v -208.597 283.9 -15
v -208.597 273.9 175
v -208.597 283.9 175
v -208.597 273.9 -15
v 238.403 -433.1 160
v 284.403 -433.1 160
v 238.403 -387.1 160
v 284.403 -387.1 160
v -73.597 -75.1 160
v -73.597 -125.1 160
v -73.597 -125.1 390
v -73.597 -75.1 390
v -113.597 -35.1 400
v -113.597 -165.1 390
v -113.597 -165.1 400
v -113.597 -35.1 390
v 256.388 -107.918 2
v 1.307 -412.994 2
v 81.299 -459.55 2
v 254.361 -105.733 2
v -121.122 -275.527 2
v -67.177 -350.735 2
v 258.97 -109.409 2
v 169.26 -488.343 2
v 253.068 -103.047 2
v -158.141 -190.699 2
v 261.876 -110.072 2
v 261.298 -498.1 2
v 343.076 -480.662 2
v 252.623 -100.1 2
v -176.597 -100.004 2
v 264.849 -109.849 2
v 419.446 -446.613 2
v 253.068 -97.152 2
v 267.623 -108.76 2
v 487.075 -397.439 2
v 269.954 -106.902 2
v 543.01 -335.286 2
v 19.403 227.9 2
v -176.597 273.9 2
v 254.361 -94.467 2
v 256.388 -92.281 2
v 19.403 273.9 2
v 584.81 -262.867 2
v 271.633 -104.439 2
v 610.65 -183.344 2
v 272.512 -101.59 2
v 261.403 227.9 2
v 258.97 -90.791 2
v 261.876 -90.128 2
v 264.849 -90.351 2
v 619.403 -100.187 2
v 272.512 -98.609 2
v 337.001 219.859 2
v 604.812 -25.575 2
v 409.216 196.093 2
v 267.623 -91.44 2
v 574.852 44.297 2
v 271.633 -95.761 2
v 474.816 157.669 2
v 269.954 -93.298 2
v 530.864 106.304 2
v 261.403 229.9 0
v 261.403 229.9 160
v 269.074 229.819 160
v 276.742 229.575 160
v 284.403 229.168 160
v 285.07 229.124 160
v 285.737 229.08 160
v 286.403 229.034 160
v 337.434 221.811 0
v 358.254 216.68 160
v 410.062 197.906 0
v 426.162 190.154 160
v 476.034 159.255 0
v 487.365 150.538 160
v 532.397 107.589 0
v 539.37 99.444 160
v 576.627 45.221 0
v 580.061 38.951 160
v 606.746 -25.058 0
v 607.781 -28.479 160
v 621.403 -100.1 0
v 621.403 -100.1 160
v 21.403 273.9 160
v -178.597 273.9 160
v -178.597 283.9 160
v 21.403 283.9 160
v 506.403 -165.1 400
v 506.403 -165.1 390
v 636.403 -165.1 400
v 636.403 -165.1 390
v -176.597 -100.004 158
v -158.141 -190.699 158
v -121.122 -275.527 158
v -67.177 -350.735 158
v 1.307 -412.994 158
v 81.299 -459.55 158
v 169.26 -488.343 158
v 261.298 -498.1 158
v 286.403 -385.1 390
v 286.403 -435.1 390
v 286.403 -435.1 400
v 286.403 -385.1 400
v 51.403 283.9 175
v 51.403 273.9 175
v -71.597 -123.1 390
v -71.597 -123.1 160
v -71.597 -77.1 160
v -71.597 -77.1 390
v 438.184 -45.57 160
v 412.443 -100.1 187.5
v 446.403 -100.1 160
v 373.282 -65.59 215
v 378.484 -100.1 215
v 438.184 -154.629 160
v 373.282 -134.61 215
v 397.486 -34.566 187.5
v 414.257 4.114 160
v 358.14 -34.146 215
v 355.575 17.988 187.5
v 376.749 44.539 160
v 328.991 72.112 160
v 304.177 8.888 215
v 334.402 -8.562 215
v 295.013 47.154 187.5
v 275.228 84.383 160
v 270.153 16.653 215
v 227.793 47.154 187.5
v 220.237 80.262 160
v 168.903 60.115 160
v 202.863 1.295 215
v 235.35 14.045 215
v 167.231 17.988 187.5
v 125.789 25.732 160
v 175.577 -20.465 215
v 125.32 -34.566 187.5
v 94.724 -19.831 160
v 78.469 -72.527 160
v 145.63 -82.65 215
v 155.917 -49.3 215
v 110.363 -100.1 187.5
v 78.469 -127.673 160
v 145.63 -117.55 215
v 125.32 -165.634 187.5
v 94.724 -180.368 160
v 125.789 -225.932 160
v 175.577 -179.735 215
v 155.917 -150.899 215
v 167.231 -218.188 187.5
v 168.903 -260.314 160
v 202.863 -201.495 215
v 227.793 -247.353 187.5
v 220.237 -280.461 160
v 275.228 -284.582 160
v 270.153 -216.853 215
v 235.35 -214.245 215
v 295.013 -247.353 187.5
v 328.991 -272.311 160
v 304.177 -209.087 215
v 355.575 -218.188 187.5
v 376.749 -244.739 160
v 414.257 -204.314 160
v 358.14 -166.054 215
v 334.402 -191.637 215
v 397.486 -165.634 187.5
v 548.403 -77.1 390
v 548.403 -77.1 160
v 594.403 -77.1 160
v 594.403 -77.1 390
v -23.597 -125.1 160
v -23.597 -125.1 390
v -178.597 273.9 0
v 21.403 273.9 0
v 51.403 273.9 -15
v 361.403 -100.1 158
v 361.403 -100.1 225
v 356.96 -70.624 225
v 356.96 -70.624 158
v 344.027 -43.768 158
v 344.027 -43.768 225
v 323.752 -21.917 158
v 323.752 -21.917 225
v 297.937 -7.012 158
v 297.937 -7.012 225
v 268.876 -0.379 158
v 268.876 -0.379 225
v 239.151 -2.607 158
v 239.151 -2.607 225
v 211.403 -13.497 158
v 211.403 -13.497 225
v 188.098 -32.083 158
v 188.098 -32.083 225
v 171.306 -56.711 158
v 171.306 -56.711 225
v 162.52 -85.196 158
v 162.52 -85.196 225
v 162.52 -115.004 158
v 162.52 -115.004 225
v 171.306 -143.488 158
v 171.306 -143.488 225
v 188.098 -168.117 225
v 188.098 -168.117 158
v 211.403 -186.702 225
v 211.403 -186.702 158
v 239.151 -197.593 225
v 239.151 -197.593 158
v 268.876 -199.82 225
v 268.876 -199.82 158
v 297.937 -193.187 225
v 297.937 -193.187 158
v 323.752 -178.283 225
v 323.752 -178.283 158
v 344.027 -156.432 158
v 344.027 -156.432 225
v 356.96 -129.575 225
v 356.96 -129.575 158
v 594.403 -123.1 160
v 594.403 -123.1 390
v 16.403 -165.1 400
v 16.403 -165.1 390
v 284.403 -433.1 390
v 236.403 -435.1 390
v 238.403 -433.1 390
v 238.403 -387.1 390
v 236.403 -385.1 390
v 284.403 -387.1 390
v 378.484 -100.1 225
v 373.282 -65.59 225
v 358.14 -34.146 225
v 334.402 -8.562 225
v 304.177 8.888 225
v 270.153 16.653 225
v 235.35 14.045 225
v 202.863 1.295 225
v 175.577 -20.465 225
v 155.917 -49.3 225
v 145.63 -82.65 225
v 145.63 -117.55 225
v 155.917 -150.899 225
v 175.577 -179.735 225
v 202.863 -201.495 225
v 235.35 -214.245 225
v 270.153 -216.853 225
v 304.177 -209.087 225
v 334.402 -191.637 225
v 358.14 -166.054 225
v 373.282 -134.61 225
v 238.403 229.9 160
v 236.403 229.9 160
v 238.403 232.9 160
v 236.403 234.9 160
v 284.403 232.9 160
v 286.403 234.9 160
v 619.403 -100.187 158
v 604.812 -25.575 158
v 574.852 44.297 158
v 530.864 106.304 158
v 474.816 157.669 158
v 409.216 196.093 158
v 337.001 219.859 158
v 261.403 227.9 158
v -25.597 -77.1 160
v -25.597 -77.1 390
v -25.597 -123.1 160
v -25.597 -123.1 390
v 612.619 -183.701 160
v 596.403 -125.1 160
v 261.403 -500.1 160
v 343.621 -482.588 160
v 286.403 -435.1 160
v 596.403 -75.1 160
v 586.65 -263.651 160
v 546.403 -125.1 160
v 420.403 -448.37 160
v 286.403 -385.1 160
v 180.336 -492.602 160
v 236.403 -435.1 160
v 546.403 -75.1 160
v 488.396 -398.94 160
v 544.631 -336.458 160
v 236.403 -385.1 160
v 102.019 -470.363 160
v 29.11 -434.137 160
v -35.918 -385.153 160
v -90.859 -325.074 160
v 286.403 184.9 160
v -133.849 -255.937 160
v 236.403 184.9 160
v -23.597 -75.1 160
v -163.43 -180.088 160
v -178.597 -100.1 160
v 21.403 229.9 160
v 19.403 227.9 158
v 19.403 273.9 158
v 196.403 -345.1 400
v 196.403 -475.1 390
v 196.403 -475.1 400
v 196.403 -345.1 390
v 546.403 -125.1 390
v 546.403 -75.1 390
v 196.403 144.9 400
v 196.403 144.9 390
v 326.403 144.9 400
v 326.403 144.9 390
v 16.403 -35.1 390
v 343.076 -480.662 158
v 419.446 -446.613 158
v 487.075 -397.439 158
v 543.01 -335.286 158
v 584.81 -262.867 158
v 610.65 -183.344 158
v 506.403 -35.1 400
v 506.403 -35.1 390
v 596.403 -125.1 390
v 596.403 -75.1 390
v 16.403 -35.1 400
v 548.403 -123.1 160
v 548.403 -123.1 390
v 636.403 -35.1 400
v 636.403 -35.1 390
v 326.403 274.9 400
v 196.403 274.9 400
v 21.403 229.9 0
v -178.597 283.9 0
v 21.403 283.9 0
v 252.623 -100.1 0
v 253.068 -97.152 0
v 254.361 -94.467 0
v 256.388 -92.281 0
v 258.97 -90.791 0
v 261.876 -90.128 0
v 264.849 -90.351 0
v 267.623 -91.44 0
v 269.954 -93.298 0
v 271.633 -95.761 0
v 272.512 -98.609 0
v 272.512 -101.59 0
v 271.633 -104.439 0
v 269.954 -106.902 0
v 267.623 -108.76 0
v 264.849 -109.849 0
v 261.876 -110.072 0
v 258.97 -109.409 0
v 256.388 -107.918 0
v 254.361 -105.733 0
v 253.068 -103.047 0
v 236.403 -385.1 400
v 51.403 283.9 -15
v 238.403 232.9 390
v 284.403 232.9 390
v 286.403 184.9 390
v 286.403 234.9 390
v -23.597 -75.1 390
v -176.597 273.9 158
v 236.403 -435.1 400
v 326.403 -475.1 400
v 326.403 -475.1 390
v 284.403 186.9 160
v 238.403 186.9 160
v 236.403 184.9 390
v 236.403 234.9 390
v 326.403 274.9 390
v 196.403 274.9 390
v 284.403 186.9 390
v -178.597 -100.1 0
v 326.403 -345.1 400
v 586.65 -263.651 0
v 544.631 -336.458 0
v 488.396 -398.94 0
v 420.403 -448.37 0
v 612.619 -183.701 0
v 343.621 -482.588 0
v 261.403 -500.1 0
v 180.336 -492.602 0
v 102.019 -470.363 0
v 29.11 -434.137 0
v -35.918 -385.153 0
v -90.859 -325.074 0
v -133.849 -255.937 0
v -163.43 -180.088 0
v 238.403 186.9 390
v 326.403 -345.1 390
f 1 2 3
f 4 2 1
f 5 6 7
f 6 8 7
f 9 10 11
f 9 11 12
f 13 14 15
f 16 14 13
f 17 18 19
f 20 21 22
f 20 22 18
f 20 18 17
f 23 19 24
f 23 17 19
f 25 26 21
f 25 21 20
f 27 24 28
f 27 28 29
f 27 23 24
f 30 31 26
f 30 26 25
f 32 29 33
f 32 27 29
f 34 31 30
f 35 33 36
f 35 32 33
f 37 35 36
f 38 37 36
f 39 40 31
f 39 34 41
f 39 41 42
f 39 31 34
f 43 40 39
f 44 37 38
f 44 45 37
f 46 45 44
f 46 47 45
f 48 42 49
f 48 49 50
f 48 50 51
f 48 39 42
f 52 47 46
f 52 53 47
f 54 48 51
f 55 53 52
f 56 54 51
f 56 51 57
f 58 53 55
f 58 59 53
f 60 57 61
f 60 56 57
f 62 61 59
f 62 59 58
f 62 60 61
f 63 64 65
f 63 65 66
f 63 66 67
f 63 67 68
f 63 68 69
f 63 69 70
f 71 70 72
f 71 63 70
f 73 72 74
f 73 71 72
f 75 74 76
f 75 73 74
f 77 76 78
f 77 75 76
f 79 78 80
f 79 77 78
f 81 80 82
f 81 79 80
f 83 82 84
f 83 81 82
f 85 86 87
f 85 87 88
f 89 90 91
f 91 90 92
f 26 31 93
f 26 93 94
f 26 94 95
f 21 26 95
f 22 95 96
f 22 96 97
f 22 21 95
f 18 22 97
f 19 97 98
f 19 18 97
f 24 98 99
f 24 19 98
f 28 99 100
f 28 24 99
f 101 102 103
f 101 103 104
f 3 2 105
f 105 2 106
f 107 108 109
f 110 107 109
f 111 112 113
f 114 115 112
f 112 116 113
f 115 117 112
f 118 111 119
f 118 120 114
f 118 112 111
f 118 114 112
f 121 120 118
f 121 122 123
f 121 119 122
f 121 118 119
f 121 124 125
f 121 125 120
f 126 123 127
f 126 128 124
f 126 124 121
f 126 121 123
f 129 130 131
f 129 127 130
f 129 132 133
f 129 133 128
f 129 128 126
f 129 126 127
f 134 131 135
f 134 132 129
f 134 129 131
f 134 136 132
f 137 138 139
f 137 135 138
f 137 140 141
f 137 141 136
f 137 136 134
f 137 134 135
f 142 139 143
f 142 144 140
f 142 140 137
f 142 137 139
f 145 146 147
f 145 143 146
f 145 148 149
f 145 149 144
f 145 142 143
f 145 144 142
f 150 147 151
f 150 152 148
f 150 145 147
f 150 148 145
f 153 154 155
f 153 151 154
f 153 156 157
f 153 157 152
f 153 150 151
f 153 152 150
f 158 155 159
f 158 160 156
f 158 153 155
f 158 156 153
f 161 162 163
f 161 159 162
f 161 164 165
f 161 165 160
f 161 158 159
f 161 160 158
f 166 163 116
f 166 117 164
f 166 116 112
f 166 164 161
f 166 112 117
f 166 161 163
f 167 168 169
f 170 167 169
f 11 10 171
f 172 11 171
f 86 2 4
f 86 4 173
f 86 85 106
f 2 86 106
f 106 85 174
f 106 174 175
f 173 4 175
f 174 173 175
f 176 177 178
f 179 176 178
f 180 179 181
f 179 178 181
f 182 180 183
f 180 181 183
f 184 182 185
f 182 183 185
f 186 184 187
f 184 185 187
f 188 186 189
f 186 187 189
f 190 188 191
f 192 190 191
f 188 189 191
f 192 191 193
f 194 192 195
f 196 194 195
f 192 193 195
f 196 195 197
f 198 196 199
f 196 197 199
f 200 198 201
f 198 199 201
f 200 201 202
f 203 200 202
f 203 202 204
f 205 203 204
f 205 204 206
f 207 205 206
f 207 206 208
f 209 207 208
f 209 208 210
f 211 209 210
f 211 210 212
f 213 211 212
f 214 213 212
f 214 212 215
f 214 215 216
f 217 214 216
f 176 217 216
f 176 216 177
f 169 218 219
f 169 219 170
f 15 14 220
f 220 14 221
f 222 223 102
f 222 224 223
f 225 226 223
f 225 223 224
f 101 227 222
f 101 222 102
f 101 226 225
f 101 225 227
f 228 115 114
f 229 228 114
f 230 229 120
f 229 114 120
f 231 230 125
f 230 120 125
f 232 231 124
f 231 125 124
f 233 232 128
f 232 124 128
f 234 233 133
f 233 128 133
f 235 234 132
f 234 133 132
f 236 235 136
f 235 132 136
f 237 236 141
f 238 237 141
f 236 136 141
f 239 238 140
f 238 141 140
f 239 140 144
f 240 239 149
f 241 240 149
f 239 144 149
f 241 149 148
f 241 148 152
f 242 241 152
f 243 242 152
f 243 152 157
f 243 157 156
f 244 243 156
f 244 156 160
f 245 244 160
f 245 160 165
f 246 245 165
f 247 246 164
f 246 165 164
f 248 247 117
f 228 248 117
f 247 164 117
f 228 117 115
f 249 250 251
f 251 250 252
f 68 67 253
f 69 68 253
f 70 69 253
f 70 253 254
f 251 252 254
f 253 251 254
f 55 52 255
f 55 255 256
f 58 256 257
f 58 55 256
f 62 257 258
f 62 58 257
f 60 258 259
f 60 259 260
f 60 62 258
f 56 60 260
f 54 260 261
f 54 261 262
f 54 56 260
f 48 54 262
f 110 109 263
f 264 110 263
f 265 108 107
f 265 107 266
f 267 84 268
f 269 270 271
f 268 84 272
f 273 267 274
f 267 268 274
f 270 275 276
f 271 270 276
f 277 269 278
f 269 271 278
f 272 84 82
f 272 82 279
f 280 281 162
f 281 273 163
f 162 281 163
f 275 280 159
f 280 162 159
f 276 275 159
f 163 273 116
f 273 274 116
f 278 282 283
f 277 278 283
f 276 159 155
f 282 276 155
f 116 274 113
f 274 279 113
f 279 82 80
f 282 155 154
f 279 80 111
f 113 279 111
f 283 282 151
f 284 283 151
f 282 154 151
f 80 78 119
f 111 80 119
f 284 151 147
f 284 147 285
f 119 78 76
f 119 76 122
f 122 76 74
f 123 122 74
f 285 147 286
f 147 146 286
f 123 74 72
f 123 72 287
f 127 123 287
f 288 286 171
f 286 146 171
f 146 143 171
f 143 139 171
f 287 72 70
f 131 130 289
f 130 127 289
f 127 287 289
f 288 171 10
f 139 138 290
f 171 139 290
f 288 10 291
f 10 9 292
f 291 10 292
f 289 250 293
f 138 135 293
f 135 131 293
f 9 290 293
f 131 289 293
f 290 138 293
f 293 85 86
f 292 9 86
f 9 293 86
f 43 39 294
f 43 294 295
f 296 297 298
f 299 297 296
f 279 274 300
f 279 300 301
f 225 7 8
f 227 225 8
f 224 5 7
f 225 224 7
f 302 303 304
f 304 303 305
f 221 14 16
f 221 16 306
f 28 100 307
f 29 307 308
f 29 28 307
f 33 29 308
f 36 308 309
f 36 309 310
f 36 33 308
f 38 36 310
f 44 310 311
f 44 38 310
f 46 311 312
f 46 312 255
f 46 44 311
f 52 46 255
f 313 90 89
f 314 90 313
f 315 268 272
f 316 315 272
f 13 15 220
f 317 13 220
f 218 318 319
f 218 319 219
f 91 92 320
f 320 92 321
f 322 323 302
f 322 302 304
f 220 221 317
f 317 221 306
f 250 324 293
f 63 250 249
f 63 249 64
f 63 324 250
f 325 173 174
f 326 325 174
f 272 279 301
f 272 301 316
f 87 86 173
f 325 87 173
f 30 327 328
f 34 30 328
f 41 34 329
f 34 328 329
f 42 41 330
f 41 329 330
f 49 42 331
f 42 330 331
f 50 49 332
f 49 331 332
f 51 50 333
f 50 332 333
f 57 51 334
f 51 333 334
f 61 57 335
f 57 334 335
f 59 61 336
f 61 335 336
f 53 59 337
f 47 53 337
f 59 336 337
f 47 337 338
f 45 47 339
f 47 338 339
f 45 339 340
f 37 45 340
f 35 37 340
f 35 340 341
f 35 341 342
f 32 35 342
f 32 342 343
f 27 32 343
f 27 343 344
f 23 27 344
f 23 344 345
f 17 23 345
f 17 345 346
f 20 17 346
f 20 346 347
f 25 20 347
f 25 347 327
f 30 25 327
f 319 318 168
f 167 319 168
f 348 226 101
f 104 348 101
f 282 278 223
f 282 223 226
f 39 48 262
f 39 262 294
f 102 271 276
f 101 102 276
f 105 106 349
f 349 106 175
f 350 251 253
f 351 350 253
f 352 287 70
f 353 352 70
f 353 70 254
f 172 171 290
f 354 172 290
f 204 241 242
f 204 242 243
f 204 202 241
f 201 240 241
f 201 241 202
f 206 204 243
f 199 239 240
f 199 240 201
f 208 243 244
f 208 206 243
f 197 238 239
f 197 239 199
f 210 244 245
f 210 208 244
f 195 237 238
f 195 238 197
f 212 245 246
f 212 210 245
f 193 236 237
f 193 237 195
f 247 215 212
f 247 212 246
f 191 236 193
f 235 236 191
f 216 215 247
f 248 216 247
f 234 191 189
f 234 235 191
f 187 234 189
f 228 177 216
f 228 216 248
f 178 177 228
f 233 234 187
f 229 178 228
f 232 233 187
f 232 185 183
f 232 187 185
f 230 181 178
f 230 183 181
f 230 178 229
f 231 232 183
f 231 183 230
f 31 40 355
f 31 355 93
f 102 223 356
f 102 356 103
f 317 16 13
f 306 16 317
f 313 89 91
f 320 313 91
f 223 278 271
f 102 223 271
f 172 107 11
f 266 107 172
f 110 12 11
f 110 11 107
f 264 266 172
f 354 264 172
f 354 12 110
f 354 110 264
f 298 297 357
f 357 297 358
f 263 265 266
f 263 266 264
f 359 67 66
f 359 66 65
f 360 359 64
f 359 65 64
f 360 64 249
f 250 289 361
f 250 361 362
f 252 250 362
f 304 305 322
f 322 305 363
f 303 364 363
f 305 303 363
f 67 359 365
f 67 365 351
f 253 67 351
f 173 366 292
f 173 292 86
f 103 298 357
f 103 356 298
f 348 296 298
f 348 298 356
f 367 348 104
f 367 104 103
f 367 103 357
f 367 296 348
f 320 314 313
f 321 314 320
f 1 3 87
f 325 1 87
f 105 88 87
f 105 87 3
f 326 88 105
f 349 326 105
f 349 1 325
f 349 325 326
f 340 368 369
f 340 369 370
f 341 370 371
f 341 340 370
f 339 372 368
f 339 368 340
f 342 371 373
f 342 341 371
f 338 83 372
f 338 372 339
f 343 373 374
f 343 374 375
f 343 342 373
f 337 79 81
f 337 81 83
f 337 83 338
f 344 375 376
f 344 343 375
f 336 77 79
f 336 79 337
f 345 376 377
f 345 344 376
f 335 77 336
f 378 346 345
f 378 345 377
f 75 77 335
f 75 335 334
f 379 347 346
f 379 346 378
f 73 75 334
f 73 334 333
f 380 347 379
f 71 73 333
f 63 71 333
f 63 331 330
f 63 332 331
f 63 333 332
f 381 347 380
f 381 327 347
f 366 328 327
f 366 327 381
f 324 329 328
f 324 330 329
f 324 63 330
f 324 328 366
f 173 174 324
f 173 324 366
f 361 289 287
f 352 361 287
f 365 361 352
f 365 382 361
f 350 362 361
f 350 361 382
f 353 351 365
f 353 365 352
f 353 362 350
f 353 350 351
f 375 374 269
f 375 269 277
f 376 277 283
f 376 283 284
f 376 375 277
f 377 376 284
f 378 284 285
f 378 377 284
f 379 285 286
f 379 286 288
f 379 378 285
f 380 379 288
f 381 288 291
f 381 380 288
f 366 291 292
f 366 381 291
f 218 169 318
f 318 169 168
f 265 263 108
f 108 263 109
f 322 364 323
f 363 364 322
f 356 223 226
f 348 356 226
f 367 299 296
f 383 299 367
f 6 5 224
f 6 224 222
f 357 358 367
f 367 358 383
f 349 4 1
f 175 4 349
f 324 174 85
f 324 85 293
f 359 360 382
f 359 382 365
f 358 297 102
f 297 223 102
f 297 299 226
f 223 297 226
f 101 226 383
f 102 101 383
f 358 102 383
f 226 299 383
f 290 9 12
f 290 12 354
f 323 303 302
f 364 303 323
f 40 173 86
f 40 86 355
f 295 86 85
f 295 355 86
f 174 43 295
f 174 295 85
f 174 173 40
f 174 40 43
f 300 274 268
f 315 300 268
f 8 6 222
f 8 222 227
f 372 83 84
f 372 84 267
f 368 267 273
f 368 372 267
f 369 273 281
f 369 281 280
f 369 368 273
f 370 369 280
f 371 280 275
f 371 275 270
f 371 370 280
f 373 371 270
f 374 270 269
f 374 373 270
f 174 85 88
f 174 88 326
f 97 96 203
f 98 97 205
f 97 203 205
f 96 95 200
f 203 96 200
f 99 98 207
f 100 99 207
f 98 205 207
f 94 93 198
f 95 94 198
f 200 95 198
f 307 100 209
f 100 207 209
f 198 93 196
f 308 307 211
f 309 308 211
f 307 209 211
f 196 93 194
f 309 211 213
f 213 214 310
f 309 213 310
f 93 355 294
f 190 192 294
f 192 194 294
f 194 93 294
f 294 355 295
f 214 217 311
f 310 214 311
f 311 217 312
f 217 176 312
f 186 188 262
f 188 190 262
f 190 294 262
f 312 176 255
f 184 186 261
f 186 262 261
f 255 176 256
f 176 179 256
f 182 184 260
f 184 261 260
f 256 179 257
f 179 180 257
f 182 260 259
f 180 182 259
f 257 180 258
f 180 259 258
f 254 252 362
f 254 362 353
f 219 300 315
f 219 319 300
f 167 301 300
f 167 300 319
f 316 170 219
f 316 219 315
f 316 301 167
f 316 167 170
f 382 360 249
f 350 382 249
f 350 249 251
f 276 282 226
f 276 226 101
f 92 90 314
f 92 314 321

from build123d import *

# Parameters (mm, degrees)
BOSS_EXTRUDE1_DEPTH       = 160
SHELL1_START              = 2
SHELL1_DEPTH              = 156
SKETCH4_R                 = 90
CUT_EXTRUDE1_DEPTH        = 54
SKETCH5_R                 = 185
BOSS_EXTRUDE2_DEPTH       = 55
BOSS_EXTRUDE2_TAPER       = 51
SKETCH6_R                 = 117.080656391
BOSS_EXTRUDE3_DEPTH       = 10
SKETCH7_R                 = 100
CUT_EXTRUDE2_DEPTH        = 117
SKETCH8_R                 = 10
CUT_EXTRUDE3_DEPTH        = 117
SKETCH11_W                = 260
SKETCH11_H                = 190
SKETCH11_W_2              = 200
SKETCH11_H_2              = 160
BOSS_EXTRUDE5_DEPTH       = 10
EXTRUDE_THIN1_OUTLINE_W   = 50
EXTRUDE_THIN1_OUTLINE_H   = 50
EXTRUDE_THIN1_OUTLINE_W_2 = 46
EXTRUDE_THIN1_OUTLINE_H_2 = 46
EXTRUDE_THIN1_DEPTH       = 230
SKETCH16_W                = 130
SKETCH16_H                = 130
BOSS_EXTRUDE6_DEPTH       = 10
SKETCH16_W_2              = 50
SKETCH16_H_2              = 50
BOSS_EXTRUDE6_2_DEPTH     = 10
BOSS_EXTRUDE6_3_DEPTH     = 10
BOSS_EXTRUDE6_4_DEPTH     = 10


# Read off the part's stored shape, not the designer's step: Shell1, Extrude-Thin1
with BuildPart() as part:
    # Sketch2 → Boss-Extrude1 (new body)
    with BuildSketch(Plane.XY):
        with BuildLine():
            Line((-178.596901506, -100.099781817), (-178.596901506, 273.900218183))
            Line((-178.596901506, 273.900218183), (21.403098494, 273.900218183))
            Line((21.403098494, 273.900218183), (21.403098494, 229.900218183))
            Line((21.403098494, 229.900218183), (261.403098494, 229.900218183))
            ThreePointArc((261.403098494, 229.900218183), (505.585407435, 134.917282483), (621.403098494, -100.099781817))
            ThreePointArc((621.403098494, -100.099781817), (518.15029954, -369.172262759), (261.403098494, -500.099781817))
            ThreePointArc((261.403098494, -500.099781817), (-35.918276453, -385.153294258), (-178.596901506, -100.099781817))
        make_face()
    extrude(amount=BOSS_EXTRUDE1_DEPTH)

    # Shell1 outline → Shell1 (cut)
    with BuildSketch(Plane.XY.offset(SHELL1_START)):
        with BuildLine():
            ThreePointArc((-176.596901506, -100.004435497), (-34.576684312, -383.670001847), (261.297822808, -498.099769223))
            ThreePointArc((261.297822808, -498.099769223), (516.669826437, -367.827538484), (619.403089044, -100.18675106))
            ThreePointArc((619.403089044, -100.18675106), (504.20191059, 133.472347591), (261.403098494, 227.900218183))
            Line((261.403098494, 227.900218183), (19.403098494, 227.900218183))
            Line((19.403098494, 227.900218183), (19.403098494, 273.900218183))
            Line((19.403098494, 273.900218183), (-176.596901506, 273.900218183))
            Line((-176.596901506, 273.900218183), (-176.596901506, -100.004435497))
        make_face()
    extrude(amount=SHELL1_DEPTH, mode=Mode.SUBTRACT)

    # Sketch4 → Cut-Extrude1 (cut)
    with BuildSketch(Plane.XY.offset(160)):
        with Locations((261.403098494, -100.099781817)):
            Circle(SKETCH4_R)
    extrude(amount=-CUT_EXTRUDE1_DEPTH, mode=Mode.SUBTRACT)

    # Sketch5 → Boss-Extrude2 (add)
    with BuildSketch(Plane.XY.offset(160)):
        with Locations((261.403098494, -100.099781817)):
            Circle(SKETCH5_R)
    extrude(amount=BOSS_EXTRUDE2_DEPTH, taper=BOSS_EXTRUDE2_TAPER)

    # Sketch6 → Boss-Extrude3 (add)
    with BuildSketch(Plane.XY.offset(215)):
        with Locations((261.403098494, -100.099781817)):
            Circle(SKETCH6_R)
    extrude(amount=BOSS_EXTRUDE3_DEPTH)

    # Sketch7 → Cut-Extrude2 (cut)
    with BuildSketch(Plane.XY.offset(225)):
        with Locations((261.403098494, -100.099781817)):
            Circle(SKETCH7_R)
    extrude(amount=-CUT_EXTRUDE2_DEPTH, mode=Mode.SUBTRACT)

    # Sketch8 → Cut-Extrude3 (cut)
    with BuildSketch(Plane(origin=(0, 0, 0), x_dir=(-1, 0, 0), z_dir=(0, 0, -1))):
        with Locations((-262.623327997, -100.099781817)):
            Circle(SKETCH8_R)
    extrude(amount=-CUT_EXTRUDE3_DEPTH, mode=Mode.SUBTRACT)

    # Extrude-Thin1 outline → Extrude-Thin1 (add)
    # profile 1 of 4: a face of its own
    with BuildSketch(Plane.XY.offset(160)):
        with Locations((-48.596901506, -100.099781817)):
            Rectangle(EXTRUDE_THIN1_OUTLINE_W, EXTRUDE_THIN1_OUTLINE_H)
        with Locations((-48.596901506, -100.099781817)):
            Rectangle(EXTRUDE_THIN1_OUTLINE_W_2, EXTRUDE_THIN1_OUTLINE_H_2, mode=Mode.SUBTRACT)
    # profile 2 of 4: a face of its own
    with BuildSketch(Plane.XY.offset(160)):
        with Locations((571.403098494, -100.099781817)):
            Rectangle(EXTRUDE_THIN1_OUTLINE_W, EXTRUDE_THIN1_OUTLINE_H)
        with Locations((571.403098494, -100.099781817)):
            Rectangle(EXTRUDE_THIN1_OUTLINE_W_2, EXTRUDE_THIN1_OUTLINE_H_2, mode=Mode.SUBTRACT)
    # profile 3 of 4: a face of its own
    with BuildSketch(Plane.XY.offset(160)):
        with Locations((261.403098494, 209.900218183)):
            Rectangle(EXTRUDE_THIN1_OUTLINE_W, EXTRUDE_THIN1_OUTLINE_H)
        with Locations((261.403098494, 209.900218183)):
            Rectangle(EXTRUDE_THIN1_OUTLINE_W_2, EXTRUDE_THIN1_OUTLINE_H_2, mode=Mode.SUBTRACT)
    # profile 4 of 4: a face of its own
    with BuildSketch(Plane.XY.offset(160)):
        with Locations((261.403098494, -410.099781817)):
            Rectangle(EXTRUDE_THIN1_OUTLINE_W, EXTRUDE_THIN1_OUTLINE_H)
        with Locations((261.403098494, -410.099781817)):
            Rectangle(EXTRUDE_THIN1_OUTLINE_W_2, EXTRUDE_THIN1_OUTLINE_H_2, mode=Mode.SUBTRACT)
    extrude(amount=EXTRUDE_THIN1_DEPTH)


with BuildPart() as body_2:
    # Sketch11 → Boss-Extrude5 (new body)
    with BuildSketch(Plane(origin=(0, 273.900218183, 0), x_dir=(1, 0, 0), z_dir=(0, 1, 0))):
        with Locations((-78.596901506, -80)):
            Rectangle(SKETCH11_W, SKETCH11_H)
        with Locations((-78.596901506, -80)):
            Rectangle(SKETCH11_W_2, SKETCH11_H_2, mode=Mode.SUBTRACT)
    extrude(amount=BOSS_EXTRUDE5_DEPTH)


with BuildPart() as body_3:
    # Sketch16 → Boss-Extrude6 (new body)
    with BuildSketch(Plane.XY.offset(390)):
        with Locations((-48.596901506, -100.099781817)):
            Rectangle(SKETCH16_W, SKETCH16_H)
    extrude(amount=BOSS_EXTRUDE6_DEPTH)


with BuildPart() as body_4:
    # Sketch16 → Boss-Extrude6 2 (new body)
    with BuildSketch(Plane.XY.offset(390)):
        with Locations((261.403098494, -410.099781817)):
            Rectangle(SKETCH16_W, SKETCH16_H)
        with Locations((261.403098494, -410.099781817)):
            Rectangle(SKETCH16_W_2, SKETCH16_H_2, mode=Mode.SUBTRACT)
    extrude(amount=BOSS_EXTRUDE6_2_DEPTH)


with BuildPart() as body_5:
    # Sketch16 → Boss-Extrude6 3 (new body)
    with BuildSketch(Plane.XY.offset(390)):
        with Locations((261.403098494, 209.900218183)):
            Rectangle(SKETCH16_W, SKETCH16_H)
    extrude(amount=BOSS_EXTRUDE6_3_DEPTH)


with BuildPart() as body_6:
    # Sketch16 → Boss-Extrude6 4 (new body)
    with BuildSketch(Plane.XY.offset(390)):
        with Locations((571.403098494, -100.099781817)):
            Rectangle(SKETCH16_W, SKETCH16_H)
    extrude(amount=BOSS_EXTRUDE6_4_DEPTH)


solid = Compound([part.part, body_2.part, body_3.part, body_4.part, body_5.part, body_6.part])
